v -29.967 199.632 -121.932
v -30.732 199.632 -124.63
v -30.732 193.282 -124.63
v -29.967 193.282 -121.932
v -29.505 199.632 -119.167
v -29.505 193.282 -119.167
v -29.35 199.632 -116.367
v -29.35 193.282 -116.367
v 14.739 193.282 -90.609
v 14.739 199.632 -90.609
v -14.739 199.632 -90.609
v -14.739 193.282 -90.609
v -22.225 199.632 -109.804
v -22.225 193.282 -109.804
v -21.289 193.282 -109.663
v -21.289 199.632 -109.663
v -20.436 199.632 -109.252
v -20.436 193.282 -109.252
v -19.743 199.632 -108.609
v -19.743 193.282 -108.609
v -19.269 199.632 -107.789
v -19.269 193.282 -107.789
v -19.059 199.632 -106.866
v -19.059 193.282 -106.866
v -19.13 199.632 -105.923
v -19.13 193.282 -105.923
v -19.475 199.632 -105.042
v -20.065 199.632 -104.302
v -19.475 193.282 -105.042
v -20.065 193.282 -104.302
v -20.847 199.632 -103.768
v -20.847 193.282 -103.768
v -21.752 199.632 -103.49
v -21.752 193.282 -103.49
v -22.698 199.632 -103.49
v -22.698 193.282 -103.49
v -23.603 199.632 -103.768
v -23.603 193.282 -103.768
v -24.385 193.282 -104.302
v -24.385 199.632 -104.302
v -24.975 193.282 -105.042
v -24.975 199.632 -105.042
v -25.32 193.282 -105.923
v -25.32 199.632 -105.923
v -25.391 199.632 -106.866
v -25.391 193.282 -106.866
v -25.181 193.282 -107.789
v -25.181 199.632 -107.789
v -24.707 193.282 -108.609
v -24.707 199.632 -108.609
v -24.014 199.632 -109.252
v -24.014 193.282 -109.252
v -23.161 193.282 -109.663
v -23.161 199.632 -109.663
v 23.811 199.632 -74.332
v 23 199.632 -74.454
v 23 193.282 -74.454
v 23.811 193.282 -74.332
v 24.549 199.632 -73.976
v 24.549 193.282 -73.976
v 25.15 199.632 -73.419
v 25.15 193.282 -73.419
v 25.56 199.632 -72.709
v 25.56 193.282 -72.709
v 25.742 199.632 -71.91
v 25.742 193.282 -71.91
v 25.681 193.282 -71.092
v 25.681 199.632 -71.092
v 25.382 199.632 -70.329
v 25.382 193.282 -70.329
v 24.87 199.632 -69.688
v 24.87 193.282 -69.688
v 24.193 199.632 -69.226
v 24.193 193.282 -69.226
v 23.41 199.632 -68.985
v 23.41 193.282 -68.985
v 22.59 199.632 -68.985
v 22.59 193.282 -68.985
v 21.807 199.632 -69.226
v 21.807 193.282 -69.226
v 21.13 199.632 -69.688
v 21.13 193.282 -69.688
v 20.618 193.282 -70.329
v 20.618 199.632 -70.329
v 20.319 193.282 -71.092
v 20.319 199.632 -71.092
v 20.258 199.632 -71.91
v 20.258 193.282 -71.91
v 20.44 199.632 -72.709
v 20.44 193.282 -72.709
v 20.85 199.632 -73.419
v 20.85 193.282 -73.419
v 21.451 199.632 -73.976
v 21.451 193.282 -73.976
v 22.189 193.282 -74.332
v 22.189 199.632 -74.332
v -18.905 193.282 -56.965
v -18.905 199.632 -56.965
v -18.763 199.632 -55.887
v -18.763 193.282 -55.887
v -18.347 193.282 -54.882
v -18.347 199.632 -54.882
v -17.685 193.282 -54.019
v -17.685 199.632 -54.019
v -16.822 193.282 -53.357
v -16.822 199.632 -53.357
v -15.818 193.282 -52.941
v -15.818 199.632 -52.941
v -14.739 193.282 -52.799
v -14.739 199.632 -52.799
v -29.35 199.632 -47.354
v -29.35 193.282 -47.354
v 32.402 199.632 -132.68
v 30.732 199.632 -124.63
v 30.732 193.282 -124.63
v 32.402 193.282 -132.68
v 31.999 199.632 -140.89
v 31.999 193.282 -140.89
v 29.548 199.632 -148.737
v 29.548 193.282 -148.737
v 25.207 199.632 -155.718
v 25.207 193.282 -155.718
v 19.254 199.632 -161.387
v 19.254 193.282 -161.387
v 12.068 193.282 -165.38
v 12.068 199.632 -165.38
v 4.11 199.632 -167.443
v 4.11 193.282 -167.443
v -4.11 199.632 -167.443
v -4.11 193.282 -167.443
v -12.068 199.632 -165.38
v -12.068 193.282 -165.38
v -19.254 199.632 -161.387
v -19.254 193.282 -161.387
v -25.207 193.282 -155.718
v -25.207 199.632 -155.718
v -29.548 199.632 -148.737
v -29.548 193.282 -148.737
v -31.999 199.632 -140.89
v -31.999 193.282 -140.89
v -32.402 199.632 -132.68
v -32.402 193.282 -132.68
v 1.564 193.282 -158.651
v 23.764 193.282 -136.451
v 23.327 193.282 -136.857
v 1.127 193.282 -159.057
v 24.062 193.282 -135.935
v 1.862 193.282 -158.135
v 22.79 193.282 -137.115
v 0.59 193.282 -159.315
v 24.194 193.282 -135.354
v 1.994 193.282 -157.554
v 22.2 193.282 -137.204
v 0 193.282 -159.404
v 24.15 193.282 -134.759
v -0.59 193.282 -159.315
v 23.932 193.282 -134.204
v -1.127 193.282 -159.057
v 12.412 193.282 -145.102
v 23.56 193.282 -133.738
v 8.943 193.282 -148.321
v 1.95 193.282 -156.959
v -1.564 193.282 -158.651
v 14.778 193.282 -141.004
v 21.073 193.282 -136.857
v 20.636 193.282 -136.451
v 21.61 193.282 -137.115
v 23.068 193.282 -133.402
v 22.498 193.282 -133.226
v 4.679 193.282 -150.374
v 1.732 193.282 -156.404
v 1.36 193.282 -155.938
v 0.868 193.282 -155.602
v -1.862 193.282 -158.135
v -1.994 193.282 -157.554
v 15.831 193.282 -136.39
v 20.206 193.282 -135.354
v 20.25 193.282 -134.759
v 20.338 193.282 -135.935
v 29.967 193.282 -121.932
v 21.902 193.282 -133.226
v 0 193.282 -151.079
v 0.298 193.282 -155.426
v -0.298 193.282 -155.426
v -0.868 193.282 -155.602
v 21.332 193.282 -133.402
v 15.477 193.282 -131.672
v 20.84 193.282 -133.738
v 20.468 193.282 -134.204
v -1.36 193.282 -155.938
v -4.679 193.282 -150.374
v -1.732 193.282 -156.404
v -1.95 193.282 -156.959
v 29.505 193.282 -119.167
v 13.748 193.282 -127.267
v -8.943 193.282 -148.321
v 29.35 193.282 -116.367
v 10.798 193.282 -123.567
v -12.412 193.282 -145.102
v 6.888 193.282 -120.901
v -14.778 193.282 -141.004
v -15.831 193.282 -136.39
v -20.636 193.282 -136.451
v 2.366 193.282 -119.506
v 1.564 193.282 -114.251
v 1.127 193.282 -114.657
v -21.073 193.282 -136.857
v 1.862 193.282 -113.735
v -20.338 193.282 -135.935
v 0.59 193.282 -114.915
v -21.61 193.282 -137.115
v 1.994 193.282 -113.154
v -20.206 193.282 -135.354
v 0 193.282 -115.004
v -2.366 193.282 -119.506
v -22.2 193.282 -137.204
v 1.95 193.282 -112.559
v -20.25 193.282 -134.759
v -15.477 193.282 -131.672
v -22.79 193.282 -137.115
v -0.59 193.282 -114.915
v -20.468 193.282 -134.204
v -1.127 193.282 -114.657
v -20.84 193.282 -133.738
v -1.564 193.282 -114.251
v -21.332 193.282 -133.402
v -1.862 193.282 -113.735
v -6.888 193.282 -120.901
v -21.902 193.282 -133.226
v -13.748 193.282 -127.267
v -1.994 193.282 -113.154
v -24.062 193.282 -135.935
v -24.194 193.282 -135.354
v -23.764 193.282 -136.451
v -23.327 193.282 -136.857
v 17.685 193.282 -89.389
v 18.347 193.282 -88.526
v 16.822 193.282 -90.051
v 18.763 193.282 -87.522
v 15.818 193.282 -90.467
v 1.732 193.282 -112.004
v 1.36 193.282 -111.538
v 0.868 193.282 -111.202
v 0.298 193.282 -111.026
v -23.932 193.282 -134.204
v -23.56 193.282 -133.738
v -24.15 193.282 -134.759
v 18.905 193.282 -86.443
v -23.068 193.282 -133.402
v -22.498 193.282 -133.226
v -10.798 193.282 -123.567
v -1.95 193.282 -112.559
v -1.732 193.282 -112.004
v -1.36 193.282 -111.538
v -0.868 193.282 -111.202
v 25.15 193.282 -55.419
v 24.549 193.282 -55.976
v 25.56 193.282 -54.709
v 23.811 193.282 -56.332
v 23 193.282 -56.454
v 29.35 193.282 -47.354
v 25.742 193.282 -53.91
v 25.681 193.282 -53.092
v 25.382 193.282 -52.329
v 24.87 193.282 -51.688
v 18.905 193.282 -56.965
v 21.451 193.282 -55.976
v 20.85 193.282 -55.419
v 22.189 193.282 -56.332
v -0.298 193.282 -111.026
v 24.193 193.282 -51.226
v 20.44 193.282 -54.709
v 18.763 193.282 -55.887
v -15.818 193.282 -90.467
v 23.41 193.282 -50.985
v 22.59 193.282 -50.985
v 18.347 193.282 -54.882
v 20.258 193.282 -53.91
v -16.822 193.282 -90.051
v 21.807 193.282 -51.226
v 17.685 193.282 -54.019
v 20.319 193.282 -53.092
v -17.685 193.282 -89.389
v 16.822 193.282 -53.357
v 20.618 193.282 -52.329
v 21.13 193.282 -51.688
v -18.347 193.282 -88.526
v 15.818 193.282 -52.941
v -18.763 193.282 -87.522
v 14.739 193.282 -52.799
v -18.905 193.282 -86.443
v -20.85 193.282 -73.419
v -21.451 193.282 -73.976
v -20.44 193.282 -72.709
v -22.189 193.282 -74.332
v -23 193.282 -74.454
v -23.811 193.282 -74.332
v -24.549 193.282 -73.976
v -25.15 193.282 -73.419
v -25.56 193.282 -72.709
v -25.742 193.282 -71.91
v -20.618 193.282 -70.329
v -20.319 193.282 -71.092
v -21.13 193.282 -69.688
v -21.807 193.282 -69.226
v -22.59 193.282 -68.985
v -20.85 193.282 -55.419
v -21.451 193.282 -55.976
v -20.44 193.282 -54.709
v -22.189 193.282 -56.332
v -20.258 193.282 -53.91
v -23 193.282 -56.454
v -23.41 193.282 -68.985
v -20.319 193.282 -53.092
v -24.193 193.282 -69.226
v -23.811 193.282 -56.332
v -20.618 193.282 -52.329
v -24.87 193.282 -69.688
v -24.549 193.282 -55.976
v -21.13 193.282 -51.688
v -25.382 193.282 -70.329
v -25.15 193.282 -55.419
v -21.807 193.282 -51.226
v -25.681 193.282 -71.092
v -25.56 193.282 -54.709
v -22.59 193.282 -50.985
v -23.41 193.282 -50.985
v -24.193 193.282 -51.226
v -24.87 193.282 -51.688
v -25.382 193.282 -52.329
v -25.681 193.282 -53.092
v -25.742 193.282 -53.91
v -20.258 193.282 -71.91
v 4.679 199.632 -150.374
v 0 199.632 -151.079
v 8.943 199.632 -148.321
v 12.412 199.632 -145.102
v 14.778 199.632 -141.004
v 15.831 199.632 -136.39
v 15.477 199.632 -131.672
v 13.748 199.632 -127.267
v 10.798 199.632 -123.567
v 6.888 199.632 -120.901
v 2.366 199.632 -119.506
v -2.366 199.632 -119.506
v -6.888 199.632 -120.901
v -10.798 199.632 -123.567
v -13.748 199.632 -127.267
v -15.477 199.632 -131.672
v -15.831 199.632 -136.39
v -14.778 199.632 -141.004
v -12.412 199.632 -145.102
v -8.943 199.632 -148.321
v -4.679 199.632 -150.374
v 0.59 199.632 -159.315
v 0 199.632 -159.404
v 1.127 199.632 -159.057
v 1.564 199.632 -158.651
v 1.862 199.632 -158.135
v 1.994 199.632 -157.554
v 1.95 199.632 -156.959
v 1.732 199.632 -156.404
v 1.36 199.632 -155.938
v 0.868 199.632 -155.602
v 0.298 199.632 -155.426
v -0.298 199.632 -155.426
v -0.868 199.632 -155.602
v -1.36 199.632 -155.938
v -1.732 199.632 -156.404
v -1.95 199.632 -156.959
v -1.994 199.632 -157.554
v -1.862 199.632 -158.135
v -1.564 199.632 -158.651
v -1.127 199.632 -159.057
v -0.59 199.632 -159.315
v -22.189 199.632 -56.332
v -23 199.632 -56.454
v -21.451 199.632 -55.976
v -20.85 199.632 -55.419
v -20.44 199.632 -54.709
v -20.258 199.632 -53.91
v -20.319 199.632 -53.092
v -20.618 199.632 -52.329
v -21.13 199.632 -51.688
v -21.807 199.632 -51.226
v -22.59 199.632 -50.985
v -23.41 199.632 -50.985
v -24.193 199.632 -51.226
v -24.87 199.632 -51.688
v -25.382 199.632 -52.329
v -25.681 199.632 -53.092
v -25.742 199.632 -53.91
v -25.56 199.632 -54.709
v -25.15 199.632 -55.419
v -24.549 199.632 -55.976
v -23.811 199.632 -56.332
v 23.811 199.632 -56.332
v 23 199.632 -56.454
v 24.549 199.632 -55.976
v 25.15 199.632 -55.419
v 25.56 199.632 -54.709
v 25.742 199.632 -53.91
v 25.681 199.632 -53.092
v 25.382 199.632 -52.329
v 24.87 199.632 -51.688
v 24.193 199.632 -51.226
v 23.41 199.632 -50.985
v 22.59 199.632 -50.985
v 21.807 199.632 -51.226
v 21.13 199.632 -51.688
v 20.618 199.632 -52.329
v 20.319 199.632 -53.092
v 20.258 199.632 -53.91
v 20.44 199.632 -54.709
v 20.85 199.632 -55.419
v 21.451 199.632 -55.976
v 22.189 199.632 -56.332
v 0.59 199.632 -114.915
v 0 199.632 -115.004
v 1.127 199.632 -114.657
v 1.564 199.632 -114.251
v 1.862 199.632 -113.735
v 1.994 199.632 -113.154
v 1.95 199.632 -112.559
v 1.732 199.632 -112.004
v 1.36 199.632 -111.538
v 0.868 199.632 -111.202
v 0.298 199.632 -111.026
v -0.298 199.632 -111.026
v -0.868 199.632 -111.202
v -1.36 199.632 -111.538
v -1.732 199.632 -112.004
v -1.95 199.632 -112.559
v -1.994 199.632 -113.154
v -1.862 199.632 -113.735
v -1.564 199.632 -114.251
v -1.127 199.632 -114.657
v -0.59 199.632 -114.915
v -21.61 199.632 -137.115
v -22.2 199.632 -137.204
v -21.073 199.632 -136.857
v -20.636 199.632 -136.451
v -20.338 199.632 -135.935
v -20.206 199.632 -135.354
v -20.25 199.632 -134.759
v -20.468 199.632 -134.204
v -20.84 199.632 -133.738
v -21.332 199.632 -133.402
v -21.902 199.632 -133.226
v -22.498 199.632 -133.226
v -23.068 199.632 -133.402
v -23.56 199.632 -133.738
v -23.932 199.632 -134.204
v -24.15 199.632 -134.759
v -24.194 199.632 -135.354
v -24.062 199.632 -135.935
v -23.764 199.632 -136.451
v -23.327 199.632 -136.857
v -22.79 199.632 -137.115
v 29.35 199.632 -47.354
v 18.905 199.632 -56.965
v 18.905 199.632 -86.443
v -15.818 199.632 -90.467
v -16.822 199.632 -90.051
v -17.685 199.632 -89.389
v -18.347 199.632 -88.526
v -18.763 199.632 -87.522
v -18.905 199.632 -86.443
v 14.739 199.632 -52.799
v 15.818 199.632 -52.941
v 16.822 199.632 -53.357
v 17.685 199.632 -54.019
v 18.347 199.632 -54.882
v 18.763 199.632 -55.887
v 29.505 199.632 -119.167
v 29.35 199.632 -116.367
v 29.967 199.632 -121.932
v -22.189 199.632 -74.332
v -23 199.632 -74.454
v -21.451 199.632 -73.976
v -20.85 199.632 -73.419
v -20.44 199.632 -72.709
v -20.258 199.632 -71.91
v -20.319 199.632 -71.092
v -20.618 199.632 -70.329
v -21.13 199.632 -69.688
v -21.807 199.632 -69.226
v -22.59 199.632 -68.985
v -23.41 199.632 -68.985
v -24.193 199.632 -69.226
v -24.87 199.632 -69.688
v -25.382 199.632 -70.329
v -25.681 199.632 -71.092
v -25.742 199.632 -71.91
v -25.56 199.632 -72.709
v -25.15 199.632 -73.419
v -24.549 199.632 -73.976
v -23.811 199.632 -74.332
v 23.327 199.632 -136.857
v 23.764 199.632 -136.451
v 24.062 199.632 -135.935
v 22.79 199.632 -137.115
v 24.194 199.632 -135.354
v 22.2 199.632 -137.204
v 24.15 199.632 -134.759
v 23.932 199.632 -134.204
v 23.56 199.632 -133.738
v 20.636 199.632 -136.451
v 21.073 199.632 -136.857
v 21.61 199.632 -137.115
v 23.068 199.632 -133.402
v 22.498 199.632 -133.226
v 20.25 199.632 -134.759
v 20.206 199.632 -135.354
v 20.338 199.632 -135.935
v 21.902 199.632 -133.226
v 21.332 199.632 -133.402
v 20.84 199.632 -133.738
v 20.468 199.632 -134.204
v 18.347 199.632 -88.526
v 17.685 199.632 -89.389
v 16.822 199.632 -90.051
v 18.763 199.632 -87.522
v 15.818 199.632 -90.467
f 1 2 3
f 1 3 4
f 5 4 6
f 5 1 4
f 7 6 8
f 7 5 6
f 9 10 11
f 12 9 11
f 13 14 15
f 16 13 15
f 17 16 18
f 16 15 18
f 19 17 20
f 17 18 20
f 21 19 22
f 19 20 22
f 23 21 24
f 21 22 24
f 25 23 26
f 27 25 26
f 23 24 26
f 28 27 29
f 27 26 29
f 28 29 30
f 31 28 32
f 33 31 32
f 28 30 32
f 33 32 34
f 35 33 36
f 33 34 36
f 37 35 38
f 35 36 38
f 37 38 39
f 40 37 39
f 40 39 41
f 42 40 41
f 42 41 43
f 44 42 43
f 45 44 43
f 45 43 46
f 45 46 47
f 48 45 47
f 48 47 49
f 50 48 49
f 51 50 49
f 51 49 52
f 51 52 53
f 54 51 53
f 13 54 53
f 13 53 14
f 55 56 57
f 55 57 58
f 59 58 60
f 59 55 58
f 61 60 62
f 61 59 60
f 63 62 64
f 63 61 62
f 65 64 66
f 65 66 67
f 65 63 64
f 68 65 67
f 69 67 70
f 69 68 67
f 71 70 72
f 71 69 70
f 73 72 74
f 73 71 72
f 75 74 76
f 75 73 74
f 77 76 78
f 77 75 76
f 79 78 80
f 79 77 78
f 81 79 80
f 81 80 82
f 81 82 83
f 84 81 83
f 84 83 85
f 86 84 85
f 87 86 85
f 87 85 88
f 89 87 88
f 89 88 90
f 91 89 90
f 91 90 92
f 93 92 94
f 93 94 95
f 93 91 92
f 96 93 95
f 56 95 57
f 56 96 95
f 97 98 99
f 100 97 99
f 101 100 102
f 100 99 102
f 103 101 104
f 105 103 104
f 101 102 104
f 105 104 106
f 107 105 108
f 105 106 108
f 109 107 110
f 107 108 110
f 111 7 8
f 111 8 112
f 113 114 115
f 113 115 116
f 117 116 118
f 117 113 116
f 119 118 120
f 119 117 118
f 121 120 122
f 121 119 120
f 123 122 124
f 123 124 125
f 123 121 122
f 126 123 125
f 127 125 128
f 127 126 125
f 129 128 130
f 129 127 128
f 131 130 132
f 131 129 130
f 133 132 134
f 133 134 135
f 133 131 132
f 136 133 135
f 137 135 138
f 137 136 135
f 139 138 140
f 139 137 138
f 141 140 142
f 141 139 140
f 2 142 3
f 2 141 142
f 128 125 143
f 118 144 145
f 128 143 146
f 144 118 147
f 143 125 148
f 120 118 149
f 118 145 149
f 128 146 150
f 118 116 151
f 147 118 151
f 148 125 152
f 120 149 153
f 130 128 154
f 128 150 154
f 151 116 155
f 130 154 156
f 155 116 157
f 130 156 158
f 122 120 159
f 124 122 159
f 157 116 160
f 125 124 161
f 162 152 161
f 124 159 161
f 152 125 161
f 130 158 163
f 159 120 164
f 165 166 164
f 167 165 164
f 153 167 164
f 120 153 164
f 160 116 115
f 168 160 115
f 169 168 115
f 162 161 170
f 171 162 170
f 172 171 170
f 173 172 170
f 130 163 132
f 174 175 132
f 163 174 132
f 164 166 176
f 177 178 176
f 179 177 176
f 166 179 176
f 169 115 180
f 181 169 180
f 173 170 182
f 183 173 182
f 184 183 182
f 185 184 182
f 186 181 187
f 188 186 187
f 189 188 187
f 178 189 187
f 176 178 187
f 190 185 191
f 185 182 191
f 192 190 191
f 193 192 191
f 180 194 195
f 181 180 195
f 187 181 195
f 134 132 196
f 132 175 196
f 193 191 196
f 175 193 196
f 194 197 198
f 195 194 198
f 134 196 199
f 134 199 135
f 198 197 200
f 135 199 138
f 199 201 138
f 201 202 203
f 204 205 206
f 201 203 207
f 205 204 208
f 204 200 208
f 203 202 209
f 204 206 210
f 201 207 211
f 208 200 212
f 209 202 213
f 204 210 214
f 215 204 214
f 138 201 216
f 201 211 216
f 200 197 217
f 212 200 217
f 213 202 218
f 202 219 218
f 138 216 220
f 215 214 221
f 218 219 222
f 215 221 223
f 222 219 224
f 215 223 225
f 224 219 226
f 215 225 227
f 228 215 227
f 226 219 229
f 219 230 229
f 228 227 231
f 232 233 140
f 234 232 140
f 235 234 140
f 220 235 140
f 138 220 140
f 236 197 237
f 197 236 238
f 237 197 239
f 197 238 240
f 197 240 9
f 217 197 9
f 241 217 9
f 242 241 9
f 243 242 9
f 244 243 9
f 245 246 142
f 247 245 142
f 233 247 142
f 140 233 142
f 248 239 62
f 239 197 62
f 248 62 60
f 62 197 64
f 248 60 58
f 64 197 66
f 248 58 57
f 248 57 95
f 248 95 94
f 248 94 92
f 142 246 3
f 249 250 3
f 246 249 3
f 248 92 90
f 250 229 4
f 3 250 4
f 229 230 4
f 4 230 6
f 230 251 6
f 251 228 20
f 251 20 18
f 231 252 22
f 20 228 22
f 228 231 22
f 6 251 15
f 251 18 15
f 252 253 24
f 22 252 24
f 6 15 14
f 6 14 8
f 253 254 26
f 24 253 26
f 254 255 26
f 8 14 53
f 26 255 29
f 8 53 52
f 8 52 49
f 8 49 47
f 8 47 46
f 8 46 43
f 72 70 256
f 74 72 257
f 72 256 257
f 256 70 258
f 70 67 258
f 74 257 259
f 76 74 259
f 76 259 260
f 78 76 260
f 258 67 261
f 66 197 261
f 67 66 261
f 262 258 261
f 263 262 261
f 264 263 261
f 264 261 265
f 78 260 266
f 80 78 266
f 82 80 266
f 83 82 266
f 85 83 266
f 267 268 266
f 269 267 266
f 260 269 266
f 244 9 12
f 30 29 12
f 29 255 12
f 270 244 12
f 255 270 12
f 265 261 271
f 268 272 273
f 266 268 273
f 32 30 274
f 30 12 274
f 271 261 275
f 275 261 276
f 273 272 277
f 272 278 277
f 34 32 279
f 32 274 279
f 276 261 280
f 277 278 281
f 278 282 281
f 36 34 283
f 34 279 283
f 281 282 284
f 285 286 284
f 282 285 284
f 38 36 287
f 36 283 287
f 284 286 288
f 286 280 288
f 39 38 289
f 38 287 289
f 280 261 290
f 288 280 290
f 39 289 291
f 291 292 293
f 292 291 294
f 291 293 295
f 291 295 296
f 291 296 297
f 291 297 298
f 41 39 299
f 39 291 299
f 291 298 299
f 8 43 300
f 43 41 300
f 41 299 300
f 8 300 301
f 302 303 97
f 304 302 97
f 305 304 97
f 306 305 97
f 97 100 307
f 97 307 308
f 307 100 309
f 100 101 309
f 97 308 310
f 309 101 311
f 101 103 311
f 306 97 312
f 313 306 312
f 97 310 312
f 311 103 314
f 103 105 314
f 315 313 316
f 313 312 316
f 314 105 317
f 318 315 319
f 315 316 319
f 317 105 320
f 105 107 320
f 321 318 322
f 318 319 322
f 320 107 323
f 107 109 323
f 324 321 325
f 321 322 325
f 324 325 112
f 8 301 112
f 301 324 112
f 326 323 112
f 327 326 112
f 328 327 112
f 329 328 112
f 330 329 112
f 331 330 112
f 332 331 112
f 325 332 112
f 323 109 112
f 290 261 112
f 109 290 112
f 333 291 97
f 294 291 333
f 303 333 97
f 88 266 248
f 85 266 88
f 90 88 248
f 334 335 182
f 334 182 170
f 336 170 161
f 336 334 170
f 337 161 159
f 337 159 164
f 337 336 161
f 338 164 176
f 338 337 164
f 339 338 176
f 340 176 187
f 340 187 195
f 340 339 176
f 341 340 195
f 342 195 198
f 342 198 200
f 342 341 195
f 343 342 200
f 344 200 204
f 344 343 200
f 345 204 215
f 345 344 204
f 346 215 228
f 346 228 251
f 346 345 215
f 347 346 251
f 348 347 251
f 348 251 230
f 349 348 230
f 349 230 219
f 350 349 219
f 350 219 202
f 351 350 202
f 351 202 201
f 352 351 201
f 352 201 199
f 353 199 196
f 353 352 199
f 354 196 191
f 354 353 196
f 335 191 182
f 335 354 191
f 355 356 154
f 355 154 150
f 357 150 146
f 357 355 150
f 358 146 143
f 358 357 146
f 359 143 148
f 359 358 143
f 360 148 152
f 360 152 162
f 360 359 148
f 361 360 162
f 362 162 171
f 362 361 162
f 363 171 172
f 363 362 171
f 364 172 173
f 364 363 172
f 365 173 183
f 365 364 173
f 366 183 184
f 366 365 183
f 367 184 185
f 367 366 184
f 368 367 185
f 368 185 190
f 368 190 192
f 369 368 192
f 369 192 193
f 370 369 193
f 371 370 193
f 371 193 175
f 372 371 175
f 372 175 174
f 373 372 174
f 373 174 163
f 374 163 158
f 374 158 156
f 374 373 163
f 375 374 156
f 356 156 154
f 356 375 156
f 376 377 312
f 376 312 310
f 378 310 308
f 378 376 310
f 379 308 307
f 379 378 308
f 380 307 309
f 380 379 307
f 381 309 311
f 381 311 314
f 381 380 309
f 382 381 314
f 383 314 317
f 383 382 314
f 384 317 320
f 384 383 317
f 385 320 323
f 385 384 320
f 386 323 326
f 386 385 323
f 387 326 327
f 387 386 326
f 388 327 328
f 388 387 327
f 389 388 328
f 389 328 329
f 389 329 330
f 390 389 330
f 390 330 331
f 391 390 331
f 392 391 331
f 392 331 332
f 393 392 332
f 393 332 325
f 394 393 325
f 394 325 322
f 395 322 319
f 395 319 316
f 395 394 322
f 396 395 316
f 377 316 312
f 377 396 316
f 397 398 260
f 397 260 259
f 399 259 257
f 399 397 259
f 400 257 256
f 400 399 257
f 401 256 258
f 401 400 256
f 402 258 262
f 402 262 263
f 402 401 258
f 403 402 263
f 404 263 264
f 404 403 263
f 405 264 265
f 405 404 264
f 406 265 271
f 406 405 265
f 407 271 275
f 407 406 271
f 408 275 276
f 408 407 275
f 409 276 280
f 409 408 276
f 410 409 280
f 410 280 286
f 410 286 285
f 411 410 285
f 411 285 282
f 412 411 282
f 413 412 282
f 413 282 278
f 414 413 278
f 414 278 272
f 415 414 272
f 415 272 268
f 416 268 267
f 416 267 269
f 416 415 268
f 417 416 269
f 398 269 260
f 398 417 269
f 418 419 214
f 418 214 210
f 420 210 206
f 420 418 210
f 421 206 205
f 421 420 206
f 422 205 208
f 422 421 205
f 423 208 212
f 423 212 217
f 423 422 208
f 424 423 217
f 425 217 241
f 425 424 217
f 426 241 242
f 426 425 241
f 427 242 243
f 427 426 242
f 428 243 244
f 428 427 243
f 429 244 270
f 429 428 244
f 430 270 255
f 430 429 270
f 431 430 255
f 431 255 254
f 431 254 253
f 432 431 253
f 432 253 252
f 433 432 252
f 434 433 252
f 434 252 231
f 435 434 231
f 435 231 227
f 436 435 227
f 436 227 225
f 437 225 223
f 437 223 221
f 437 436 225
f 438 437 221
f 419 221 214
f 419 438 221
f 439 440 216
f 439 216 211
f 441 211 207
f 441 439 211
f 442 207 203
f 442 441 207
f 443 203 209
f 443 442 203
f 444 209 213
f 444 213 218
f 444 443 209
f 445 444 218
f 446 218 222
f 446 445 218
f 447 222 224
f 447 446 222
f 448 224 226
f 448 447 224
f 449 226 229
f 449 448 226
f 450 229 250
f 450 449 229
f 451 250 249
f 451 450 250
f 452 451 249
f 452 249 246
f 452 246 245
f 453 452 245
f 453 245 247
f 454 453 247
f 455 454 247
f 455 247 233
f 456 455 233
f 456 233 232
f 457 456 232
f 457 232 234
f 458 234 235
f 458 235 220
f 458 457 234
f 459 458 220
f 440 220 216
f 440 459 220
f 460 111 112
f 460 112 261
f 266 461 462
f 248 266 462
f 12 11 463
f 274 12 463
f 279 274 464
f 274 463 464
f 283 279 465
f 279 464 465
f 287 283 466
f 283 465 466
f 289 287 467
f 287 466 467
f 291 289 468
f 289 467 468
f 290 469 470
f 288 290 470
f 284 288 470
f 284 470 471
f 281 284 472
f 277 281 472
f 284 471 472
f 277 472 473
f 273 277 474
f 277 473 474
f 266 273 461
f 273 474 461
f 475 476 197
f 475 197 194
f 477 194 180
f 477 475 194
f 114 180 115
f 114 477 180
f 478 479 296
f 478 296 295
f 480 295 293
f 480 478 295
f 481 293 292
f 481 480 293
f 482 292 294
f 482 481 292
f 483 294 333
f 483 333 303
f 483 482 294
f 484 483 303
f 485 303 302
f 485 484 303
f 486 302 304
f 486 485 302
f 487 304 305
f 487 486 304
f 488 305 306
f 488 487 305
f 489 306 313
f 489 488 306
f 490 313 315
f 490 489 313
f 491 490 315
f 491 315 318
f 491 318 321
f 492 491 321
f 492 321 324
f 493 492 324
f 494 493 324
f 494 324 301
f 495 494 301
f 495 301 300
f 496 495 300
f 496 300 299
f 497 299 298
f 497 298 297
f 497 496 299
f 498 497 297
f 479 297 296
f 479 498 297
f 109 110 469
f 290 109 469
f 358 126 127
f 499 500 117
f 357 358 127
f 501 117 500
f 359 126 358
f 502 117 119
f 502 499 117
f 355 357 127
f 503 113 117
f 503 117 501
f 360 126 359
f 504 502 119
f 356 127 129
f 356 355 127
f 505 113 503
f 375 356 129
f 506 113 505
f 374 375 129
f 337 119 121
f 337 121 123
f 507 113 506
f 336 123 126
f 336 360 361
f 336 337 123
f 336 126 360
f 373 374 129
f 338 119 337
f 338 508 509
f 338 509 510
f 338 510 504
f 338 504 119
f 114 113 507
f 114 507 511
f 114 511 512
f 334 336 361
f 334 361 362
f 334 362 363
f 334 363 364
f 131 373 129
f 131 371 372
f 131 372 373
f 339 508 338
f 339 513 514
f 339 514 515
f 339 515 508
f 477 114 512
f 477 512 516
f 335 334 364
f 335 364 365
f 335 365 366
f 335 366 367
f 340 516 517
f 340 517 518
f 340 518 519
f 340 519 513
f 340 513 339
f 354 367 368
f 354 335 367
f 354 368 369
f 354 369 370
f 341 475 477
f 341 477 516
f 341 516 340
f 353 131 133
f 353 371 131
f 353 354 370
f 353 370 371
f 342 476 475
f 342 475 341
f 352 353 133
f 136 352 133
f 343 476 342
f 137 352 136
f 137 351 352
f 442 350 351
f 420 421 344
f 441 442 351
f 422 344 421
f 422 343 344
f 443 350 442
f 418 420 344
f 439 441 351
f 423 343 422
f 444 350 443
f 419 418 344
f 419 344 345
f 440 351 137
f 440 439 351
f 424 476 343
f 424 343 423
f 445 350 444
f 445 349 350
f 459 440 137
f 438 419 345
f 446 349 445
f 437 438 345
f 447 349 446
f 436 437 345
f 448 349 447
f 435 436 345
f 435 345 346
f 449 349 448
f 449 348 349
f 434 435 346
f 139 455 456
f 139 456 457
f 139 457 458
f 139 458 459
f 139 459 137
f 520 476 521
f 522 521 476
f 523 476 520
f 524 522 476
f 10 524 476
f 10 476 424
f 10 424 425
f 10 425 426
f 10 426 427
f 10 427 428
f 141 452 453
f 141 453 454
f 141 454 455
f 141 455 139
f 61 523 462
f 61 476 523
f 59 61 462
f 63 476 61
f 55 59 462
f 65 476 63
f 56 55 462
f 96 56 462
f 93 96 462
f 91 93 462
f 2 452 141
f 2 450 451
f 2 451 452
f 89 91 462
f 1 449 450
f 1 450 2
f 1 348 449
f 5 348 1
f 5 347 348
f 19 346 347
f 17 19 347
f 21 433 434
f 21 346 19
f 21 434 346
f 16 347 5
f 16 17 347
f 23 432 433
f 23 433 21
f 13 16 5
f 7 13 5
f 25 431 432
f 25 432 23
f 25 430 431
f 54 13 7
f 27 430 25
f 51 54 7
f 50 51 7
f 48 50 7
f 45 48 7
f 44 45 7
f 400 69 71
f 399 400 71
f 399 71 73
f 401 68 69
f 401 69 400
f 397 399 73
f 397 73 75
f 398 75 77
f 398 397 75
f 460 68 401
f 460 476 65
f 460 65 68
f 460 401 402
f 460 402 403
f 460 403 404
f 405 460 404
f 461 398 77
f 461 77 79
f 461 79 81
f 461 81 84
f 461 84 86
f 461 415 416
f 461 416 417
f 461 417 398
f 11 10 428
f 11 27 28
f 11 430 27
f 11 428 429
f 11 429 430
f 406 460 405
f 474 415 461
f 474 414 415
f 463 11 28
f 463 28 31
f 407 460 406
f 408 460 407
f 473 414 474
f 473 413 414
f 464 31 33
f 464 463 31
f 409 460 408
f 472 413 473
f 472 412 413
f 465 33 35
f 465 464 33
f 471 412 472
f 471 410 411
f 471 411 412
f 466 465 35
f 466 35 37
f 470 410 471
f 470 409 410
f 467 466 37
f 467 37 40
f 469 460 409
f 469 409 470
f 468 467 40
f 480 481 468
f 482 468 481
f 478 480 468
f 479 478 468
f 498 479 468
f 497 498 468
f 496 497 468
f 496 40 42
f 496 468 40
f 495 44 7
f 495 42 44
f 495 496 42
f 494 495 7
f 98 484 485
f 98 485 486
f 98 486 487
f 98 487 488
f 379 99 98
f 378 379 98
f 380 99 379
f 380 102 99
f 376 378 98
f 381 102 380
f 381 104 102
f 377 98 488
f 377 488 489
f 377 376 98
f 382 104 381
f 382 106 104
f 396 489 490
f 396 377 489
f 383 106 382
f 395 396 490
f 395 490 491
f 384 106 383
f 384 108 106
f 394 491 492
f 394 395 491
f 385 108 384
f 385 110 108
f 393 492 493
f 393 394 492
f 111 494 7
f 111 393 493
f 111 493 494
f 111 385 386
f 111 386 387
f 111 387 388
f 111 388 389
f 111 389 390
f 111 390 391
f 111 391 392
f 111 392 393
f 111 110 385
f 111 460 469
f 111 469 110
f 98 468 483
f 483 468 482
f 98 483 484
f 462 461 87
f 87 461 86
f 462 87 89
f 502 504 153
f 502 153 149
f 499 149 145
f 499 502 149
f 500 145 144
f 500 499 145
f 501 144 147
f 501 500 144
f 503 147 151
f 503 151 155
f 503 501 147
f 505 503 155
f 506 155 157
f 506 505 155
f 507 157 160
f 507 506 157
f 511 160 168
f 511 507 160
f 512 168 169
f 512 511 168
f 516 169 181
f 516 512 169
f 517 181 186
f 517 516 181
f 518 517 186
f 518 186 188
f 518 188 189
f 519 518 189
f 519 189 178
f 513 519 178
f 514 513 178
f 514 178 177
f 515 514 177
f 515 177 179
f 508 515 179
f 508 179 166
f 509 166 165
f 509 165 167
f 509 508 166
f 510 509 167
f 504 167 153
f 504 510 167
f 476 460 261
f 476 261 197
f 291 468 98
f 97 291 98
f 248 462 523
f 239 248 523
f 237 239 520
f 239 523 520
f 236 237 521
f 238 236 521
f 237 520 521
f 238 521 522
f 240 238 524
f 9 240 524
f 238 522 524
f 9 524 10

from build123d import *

# Parameters (mm, degrees)
SKETCH1_R           = 2.75
SKETCH1_R_2         = 15.875
SKETCH1_R_3         = 2
BOSS_EXTRUDE1_DEPTH = 6.35
SKETCH2_R           = 3.175
CUT_EXTRUDE1_DEPTH  = 171.942179124


with BuildPart() as part:
    # Sketch1 → Boss-Extrude1 (new body)
    with BuildSketch(Plane.XZ.offset(-199.631527043)):
        with BuildLine():
            Line((-29.35, -47.354073009), (29.35, -47.354073009))
            Line((29.35, -47.354073009), (29.35, -116.366676692))
            ThreePointArc((29.35, -116.366676692), (29.697848179, -120.5559116), (30.731865285, -124.630404955))
            ThreePointArc((30.731865285, -124.630404955), (0, -167.704073009), (-30.731865285, -124.630404955))
            ThreePointArc((-30.731865285, -124.630404955), (-29.697848179, -120.5559116), (-29.35, -116.366676692))
            Line((-29.35, -116.366676692), (-29.35, -47.354073009))
        make_face()
        with Locations(Location((-23, -71.704073009, 0), (0, 0, 270))):
            Circle(SKETCH1_R, mode=Mode.SUBTRACT)
        with Locations(Location((-23, -53.704073009, 0), (0, 0, 270))):
            Circle(SKETCH1_R, mode=Mode.SUBTRACT)
        with Locations(Location((23, -53.704073009, 0), (0, 0, 270))):
            Circle(SKETCH1_R, mode=Mode.SUBTRACT)
        with Locations(Location((23, -71.704073009, 0), (0, 0, 270))):
            Circle(SKETCH1_R, mode=Mode.SUBTRACT)
        with Locations(Location((0, -135.204073009, 0), (0, 0, 270))):
            Circle(SKETCH1_R_2, mode=Mode.SUBTRACT)
        with Locations(Location((-22.20000005, -135.204073009, 0), (0, 0, 270))):
            Circle(SKETCH1_R_3, mode=Mode.SUBTRACT)
        with Locations(Location((0, -113.004072959, 0), (0, 0, 270))):
            Circle(SKETCH1_R_3, mode=Mode.SUBTRACT)
        with Locations(Location((22.20000005, -135.204073009, 0), (0, 0, 270))):
            Circle(SKETCH1_R_3, mode=Mode.SUBTRACT)
        with Locations(Location((0, -157.404073059, 0), (0, 0, 270))):
            Circle(SKETCH1_R_3, mode=Mode.SUBTRACT)
        with BuildLine():
            Line((-14.739402973, -52.799073011), (14.739402973, -52.799073011))
            ThreePointArc((14.739402973, -52.799073011), (17.684924877, -54.019148132), (18.905, -56.964670036))
            Line((18.905, -56.964670036), (18.905, -86.443475982))
            ThreePointArc((18.905, -86.443475982), (17.684924878, -89.388997884), (14.739402976, -90.609073006))
            Line((14.739402976, -90.609073006), (-14.739402973, -90.609073006))
            ThreePointArc((-14.739402973, -90.609073006), (-17.684924877, -89.388997886), (-18.905, -86.443475982))
            Line((-18.905, -86.443475982), (-18.905, -56.964670036))
            ThreePointArc((-18.905, -56.964670036), (-17.684924877, -54.019148132), (-14.739402973, -52.799073011))
        make_face(mode=Mode.SUBTRACT)
    extrude(amount=BOSS_EXTRUDE1_DEPTH)

    # Sketch2 → Cut-Extrude1 (cut, through all)
    with BuildSketch(Plane.XZ.offset(-193.281527043)):
        with Locations(Location((-22.225, -106.629073009, 0), (0, 0, 270))):
            Circle(SKETCH2_R)
    extrude(amount=-CUT_EXTRUDE1_DEPTH, mode=Mode.SUBTRACT)


solid = part.part
